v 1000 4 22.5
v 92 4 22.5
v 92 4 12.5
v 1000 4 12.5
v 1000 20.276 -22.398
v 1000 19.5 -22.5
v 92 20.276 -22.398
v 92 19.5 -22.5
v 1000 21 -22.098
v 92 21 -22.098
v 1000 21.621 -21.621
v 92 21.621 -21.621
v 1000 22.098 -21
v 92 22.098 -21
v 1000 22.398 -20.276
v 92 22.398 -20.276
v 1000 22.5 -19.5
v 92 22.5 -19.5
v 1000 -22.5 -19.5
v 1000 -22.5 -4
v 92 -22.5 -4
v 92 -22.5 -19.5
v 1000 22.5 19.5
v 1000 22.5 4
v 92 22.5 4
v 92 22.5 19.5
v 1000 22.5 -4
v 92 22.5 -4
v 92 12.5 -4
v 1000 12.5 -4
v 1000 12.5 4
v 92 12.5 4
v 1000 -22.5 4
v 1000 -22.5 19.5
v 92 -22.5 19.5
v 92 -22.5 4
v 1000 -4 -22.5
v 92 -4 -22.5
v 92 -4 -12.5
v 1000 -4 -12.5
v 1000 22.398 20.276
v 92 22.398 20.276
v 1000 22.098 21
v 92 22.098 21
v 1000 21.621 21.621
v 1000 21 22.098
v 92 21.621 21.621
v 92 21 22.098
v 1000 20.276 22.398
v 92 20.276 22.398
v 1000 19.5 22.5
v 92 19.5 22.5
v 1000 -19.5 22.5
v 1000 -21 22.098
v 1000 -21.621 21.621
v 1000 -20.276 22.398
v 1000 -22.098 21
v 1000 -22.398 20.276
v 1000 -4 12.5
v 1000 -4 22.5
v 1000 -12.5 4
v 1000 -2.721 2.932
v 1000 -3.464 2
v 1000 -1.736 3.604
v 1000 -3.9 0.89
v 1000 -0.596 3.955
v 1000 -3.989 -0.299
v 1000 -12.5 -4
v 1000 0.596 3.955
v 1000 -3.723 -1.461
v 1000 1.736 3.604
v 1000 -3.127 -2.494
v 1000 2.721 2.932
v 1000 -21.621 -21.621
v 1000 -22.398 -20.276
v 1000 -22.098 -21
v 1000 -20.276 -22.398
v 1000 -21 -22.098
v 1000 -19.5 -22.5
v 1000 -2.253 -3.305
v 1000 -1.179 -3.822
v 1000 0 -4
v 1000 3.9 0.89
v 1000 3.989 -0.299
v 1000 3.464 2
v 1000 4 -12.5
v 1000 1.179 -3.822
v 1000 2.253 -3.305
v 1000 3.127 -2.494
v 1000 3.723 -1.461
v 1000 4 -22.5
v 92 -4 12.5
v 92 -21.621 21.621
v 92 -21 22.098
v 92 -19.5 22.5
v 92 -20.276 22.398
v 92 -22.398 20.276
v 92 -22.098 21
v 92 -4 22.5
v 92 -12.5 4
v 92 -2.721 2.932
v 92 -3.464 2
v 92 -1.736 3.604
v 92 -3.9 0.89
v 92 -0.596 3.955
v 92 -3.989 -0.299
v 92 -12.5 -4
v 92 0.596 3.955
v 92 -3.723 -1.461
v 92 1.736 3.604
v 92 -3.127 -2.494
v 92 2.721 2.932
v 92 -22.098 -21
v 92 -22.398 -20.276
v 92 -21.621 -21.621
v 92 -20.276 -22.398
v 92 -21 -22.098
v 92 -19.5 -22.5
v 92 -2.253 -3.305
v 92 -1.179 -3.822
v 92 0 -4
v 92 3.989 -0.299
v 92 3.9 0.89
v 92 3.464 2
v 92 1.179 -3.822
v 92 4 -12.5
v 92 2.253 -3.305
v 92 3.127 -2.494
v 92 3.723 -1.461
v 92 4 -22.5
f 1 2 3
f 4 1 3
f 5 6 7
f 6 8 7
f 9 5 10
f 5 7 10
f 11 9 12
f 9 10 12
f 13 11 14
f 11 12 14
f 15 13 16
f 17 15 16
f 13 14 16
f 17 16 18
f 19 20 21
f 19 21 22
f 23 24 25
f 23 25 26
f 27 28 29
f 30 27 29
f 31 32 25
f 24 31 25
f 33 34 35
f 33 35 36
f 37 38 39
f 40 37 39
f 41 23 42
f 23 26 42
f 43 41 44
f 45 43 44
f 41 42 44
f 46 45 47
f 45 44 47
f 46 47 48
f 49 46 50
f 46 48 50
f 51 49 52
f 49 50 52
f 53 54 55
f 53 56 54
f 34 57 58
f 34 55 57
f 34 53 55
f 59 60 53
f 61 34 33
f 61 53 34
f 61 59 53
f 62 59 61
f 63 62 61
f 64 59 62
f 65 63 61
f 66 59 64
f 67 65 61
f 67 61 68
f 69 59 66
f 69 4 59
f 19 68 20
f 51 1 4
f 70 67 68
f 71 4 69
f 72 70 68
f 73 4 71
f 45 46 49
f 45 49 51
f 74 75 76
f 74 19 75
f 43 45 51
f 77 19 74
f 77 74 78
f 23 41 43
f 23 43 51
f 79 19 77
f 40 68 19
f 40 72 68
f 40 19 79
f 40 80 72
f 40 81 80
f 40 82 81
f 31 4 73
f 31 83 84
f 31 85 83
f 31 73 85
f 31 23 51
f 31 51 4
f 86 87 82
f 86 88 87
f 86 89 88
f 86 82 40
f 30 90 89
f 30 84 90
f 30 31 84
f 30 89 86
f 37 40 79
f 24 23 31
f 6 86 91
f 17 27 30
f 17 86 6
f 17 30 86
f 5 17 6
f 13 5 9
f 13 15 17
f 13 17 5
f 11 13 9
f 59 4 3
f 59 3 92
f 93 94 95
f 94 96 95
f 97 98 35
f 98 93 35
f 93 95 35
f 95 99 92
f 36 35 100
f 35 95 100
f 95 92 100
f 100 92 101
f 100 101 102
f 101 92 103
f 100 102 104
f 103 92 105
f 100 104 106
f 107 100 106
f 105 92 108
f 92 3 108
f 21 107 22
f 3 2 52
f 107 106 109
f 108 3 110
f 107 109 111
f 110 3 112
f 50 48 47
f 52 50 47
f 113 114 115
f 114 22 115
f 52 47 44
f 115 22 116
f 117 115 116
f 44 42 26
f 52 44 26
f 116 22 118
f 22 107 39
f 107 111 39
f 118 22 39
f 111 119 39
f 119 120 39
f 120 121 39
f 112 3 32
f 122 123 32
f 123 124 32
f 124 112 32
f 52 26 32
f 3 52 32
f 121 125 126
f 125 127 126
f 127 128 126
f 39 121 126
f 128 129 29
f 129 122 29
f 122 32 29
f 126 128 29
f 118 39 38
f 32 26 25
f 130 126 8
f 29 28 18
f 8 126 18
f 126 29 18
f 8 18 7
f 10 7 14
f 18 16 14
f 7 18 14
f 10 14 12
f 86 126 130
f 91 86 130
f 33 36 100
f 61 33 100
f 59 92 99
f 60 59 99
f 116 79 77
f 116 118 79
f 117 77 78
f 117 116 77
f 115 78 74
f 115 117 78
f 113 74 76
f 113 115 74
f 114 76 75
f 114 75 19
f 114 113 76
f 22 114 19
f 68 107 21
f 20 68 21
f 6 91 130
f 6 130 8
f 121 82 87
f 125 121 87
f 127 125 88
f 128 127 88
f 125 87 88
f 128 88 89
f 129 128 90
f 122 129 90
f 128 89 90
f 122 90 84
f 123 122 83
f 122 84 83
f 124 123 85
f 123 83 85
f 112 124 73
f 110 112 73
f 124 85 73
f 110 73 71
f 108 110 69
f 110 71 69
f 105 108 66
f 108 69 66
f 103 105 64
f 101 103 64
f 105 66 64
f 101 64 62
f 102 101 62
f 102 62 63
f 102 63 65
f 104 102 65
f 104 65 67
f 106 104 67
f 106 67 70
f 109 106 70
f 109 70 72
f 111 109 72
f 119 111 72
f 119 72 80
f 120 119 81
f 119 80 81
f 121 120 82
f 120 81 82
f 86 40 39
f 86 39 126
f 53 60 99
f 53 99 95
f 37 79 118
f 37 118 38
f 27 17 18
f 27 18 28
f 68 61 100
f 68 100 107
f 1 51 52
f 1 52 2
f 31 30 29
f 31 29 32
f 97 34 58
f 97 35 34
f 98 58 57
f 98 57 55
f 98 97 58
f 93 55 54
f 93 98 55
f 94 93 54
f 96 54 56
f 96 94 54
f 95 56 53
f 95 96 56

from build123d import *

# Parameters (mm, degrees)
ESQUISSE1_R        = 4
BOSS_EXTRU_1_DEPTH = 908
FILLET1_R          = 3


with BuildPart() as part:
    # Esquisse1 → Boss.-Extru.1 (new body)
    with BuildSketch(Plane(origin=(1000, 0, 0), x_dir=(0, 0, -1), z_dir=(1, 0, 0))):
        Polygon((22.5, -4), (12.5, -4), (12.5, 4), (22.5, 4), (22.5, 22.5), (4, 22.5), (4, 12.5), (-4, 12.5), (-4, 22.5), (-22.5, 22.5), (-22.5, 4), (-12.5, 4), (-12.5, -4), (-22.5, -4), (-22.5, -22.5), (-4, -22.5), (-4, -12.5), (4, -12.5), (4, -22.5), (22.5, -22.5), align=None)
        Circle(ESQUISSE1_R, mode=Mode.SUBTRACT)
    extrude(amount=-BOSS_EXTRU_1_DEPTH)

    # Fillet1
    fillet1_edges = [part.edges().sort_by_distance(p)[0] for p in [
        (546, -22.5, -22.5),
        (546, -22.5, 22.5),
        (546, 22.5, 22.5),
        (546, 22.5, -22.5),
    ]]
    fillet(fillet1_edges, radius=FILLET1_R)


solid = part.part
